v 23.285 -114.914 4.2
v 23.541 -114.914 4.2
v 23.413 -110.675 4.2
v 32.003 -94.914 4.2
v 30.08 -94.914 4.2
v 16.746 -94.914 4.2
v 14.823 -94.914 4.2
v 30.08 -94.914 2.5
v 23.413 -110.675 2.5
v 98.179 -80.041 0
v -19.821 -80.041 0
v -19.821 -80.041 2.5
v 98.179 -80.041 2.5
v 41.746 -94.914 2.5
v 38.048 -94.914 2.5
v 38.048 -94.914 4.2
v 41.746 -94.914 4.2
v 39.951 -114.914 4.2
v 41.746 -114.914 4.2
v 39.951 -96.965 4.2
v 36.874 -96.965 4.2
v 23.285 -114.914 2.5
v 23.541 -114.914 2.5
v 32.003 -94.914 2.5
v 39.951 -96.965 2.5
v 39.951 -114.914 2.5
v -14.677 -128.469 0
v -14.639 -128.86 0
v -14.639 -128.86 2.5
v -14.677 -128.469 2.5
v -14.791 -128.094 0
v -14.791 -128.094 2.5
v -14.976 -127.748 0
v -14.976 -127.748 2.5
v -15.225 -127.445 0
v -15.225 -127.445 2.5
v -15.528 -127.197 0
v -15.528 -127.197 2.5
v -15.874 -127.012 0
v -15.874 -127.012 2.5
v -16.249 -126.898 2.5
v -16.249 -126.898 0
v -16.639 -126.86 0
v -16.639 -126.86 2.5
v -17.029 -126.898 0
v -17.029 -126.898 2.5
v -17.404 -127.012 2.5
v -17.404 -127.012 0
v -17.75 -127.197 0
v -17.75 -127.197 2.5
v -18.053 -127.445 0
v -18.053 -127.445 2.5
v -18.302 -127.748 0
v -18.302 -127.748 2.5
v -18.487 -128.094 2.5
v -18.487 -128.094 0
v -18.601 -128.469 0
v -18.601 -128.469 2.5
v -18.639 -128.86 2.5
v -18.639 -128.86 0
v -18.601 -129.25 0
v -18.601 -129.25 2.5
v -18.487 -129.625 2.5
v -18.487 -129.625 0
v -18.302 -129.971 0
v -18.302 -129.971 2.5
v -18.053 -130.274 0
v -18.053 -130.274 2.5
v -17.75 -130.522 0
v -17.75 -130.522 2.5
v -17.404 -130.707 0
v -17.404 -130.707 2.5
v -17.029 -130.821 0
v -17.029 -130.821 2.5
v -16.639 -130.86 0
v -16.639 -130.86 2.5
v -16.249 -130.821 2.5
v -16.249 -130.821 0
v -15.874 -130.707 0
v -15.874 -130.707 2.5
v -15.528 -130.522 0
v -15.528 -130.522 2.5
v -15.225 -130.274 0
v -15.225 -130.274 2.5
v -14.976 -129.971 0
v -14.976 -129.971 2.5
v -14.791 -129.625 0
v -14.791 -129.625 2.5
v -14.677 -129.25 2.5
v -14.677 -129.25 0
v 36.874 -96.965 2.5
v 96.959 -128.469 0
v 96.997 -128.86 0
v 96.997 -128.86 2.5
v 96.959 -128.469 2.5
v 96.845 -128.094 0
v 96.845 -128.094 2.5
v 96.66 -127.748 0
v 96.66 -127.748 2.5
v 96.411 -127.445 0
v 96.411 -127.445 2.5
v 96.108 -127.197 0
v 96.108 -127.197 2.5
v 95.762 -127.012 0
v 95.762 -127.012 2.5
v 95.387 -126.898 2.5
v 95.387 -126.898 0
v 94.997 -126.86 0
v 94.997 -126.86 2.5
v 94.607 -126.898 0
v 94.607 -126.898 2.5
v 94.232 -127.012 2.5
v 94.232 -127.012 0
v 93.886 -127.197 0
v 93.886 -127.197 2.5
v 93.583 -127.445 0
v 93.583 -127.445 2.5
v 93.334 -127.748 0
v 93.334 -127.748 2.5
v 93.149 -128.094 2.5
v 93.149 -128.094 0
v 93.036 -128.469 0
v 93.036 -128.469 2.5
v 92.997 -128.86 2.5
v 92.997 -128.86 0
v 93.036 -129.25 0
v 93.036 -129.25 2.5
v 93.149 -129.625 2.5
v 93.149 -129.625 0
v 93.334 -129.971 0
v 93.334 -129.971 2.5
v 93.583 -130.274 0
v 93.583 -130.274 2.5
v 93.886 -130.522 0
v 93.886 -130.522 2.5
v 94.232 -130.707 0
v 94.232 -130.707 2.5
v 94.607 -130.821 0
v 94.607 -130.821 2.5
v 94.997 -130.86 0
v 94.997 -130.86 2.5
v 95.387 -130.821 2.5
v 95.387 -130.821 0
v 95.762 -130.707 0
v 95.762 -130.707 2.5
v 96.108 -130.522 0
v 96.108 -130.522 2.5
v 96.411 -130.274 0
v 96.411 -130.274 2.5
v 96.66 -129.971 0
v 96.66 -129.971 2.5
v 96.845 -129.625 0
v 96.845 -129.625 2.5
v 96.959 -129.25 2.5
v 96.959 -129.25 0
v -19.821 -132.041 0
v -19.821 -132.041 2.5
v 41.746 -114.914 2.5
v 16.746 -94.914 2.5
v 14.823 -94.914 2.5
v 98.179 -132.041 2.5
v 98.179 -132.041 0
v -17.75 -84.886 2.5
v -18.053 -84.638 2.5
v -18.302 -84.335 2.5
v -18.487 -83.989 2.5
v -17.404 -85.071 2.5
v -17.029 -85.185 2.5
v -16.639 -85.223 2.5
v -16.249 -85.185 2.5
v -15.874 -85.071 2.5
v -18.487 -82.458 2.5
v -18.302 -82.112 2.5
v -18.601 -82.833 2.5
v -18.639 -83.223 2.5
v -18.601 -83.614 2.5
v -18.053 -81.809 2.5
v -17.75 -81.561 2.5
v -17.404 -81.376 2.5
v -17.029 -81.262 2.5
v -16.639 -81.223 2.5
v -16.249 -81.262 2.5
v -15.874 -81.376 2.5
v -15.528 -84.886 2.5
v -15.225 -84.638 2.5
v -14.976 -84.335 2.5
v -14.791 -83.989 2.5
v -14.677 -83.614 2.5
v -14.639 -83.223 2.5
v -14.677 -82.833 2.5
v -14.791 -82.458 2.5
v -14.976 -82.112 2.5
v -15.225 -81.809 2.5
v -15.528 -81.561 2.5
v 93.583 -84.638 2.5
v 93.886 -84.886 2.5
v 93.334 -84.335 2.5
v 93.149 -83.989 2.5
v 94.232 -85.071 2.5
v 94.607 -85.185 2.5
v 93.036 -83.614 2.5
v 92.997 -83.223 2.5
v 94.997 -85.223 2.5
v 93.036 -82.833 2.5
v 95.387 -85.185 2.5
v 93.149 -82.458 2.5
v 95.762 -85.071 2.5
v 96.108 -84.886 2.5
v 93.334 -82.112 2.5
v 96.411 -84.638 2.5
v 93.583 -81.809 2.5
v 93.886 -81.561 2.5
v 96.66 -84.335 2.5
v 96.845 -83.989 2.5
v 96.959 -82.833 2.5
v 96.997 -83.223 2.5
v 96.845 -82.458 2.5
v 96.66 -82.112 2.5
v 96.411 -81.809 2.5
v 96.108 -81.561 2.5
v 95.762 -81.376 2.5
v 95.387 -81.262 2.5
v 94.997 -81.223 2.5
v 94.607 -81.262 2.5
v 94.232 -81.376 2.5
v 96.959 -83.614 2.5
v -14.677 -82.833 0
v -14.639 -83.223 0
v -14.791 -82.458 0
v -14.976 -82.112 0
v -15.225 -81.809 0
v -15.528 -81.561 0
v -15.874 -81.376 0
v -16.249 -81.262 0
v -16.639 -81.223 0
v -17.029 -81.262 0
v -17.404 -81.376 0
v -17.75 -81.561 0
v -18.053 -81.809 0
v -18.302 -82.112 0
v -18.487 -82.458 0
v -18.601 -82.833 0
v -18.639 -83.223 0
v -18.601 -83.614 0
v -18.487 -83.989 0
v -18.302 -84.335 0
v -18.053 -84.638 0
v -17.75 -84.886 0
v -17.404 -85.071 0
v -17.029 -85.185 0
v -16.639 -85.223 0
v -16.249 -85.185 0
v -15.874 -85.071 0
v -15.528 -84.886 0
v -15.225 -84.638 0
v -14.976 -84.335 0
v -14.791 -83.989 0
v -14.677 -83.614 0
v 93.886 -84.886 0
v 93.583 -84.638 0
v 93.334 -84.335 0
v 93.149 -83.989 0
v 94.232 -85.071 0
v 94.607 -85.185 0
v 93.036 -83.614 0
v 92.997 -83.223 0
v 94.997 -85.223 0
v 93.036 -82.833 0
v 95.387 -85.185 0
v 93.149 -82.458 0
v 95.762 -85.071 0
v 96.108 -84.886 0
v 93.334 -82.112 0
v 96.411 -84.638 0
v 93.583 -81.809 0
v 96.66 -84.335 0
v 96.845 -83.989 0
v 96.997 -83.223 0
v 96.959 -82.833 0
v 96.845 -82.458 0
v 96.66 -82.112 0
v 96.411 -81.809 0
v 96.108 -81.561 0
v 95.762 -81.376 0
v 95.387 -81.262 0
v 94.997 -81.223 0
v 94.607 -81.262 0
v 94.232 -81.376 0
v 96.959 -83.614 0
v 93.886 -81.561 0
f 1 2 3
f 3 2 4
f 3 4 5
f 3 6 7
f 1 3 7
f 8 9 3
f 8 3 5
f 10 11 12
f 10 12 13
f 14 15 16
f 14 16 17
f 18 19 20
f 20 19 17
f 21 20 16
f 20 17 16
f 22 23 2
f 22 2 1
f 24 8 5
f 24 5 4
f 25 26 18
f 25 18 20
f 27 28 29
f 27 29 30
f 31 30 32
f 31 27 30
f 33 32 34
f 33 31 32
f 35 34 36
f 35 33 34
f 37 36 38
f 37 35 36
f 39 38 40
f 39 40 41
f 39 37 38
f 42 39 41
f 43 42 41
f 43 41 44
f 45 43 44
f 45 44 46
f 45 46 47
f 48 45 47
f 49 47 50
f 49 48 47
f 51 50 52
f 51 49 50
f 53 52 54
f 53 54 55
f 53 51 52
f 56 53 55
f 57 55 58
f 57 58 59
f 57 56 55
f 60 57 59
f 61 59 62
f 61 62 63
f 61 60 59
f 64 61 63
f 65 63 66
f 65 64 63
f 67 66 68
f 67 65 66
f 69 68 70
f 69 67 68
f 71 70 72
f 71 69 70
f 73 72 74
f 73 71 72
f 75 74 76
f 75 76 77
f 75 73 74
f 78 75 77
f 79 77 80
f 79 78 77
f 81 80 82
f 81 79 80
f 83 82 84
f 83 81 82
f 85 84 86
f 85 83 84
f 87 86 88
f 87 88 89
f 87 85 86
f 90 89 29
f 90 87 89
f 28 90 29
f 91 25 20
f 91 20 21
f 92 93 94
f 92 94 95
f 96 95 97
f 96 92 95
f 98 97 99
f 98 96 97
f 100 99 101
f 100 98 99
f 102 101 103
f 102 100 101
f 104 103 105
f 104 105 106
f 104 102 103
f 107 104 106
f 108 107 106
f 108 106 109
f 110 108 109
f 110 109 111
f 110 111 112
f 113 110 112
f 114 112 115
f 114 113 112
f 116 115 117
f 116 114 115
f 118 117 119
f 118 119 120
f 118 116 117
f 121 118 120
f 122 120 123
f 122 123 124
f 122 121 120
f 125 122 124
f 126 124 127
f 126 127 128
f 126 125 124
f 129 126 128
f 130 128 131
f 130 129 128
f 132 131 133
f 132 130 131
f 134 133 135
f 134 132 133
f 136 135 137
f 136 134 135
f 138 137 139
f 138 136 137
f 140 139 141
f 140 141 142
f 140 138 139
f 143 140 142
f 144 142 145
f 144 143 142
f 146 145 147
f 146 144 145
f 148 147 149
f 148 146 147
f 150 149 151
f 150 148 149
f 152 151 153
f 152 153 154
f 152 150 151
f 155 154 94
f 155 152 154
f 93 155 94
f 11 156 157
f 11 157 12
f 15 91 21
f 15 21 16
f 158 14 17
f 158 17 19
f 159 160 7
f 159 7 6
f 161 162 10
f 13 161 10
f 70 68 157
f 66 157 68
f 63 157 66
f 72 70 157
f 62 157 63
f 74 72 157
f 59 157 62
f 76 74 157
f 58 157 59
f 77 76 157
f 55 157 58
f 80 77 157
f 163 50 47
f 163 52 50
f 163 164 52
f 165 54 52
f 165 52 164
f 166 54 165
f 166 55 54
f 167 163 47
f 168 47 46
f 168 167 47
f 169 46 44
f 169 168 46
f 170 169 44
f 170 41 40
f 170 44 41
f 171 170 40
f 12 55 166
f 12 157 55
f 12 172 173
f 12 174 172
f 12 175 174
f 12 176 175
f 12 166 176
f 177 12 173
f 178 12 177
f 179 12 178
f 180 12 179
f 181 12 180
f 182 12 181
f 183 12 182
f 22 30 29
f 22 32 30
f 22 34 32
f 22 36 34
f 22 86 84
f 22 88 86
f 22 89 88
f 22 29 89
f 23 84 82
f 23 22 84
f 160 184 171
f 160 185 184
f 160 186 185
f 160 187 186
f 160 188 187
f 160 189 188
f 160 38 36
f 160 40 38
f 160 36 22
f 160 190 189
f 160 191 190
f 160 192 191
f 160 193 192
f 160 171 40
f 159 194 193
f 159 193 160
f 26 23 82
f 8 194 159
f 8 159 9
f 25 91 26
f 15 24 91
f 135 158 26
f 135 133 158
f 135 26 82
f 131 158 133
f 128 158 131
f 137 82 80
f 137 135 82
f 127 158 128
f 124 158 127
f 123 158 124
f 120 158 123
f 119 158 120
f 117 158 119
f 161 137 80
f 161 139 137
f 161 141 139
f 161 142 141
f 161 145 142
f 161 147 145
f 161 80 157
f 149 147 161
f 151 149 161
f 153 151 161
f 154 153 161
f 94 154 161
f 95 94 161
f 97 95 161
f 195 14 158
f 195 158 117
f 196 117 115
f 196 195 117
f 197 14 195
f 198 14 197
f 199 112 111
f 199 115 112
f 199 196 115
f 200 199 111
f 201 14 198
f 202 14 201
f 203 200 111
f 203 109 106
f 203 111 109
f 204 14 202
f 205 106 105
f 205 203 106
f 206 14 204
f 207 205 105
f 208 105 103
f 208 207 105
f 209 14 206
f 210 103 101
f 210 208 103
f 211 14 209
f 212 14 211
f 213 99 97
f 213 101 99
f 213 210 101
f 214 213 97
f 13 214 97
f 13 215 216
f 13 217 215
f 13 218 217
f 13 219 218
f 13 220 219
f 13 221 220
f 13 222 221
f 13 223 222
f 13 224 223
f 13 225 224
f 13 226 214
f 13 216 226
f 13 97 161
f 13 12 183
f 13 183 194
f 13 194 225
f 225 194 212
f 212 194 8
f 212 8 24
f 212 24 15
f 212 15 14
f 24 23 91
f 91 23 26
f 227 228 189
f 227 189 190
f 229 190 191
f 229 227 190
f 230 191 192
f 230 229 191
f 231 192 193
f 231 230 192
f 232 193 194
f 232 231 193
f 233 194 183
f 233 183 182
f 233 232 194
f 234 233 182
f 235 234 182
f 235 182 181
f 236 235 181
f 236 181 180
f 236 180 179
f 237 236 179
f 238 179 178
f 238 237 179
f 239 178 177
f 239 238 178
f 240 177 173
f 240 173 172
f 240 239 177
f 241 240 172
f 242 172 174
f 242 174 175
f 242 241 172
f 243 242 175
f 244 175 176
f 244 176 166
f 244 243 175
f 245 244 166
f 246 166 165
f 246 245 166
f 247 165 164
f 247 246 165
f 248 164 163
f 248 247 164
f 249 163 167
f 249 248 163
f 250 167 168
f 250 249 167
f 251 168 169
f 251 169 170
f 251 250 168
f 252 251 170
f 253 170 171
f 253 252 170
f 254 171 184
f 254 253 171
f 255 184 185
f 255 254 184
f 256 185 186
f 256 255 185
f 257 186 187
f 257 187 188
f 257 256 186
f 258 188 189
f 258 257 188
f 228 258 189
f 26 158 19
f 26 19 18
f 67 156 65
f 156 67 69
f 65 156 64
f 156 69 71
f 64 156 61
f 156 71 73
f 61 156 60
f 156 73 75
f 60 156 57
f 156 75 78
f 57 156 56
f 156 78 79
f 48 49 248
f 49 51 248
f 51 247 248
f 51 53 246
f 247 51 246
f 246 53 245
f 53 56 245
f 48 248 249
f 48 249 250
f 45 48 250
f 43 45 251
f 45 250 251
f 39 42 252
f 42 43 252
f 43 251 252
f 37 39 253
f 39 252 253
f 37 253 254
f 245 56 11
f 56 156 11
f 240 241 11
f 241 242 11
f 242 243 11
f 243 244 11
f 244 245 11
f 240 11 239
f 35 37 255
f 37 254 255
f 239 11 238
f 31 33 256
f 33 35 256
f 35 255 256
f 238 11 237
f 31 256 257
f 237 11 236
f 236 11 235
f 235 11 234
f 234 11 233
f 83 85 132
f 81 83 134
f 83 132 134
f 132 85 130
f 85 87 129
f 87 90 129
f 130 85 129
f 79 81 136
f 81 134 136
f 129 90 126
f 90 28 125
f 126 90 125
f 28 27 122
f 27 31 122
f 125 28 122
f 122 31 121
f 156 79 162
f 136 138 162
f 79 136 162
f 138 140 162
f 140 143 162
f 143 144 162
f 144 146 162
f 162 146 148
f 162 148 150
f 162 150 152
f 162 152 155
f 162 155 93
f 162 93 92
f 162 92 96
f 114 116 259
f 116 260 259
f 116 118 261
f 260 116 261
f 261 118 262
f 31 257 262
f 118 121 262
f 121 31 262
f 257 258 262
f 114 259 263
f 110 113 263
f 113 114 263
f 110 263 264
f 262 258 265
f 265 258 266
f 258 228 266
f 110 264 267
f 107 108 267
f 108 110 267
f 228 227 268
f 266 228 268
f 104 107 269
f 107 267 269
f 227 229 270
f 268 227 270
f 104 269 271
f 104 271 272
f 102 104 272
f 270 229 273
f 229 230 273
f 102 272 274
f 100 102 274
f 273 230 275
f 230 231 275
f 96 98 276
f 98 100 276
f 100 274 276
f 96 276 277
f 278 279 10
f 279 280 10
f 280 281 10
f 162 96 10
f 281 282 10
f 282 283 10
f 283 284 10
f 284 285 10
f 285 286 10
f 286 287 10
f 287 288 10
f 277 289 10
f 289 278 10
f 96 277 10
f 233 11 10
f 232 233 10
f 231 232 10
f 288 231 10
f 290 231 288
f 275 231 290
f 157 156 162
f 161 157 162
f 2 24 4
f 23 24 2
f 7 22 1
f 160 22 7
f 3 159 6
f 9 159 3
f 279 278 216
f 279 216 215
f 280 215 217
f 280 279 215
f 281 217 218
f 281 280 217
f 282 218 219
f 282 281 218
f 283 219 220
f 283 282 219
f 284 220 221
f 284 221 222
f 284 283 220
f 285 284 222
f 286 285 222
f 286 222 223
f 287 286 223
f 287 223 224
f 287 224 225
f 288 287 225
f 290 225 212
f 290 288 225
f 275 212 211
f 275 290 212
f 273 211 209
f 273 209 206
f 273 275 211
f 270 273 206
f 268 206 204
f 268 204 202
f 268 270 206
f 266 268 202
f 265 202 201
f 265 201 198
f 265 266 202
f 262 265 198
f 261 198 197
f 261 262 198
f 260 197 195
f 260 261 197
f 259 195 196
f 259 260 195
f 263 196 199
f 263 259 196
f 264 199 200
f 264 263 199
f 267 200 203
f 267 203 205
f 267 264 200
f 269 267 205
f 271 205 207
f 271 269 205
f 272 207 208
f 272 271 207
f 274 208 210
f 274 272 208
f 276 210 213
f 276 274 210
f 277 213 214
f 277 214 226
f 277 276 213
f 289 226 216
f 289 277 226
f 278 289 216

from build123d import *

# Parameters (mm, degrees)
SKETCH1_W           = 118
SKETCH1_H           = 52
SKETCH1_R           = 2
BOSS_EXTRUDE1_DEPTH = 2.5
BOSS_EXTRUDE2_DEPTH = 1.7


with BuildPart() as part:
    # Sketch1 → Boss-Extrude1 (new body)
    with BuildSketch(Plane.XY):
        with Locations((39.179079988, -106.041481737)):
            Rectangle(SKETCH1_W, SKETCH1_H)
        with Locations((-16.638939496, -128.859501222)):
            Circle(SKETCH1_R, mode=Mode.SUBTRACT)
        with Locations((94.997099473, -128.859501222)):
            Circle(SKETCH1_R, mode=Mode.SUBTRACT)
        with Locations((94.997099473, -83.223462252)):
            Circle(SKETCH1_R, mode=Mode.SUBTRACT)
        with Locations((-16.638939496, -83.223462252)):
            Circle(SKETCH1_R, mode=Mode.SUBTRACT)
    extrude(amount=BOSS_EXTRUDE1_DEPTH)

    # Sketch2 → Boss-Extrude2 (add)
    with BuildSketch(Plane.XY.offset(2.5)):
        Polygon((14.823144888, -94.914102462), (16.746221811, -94.914102462), (23.412888478, -110.67532041), (30.079555144, -94.914102462), (32.002632067, -94.914102462), (23.541093606, -114.914102462), (23.284683349, -114.914102462), align=None)
        Polygon((38.048305144, -94.914102462), (41.746221811, -94.914102462), (41.746221811, -114.914102462), (39.951350016, -114.914102462), (39.951350016, -96.965384513), (36.874426939, -96.965384513), align=None)
    extrude(amount=BOSS_EXTRUDE2_DEPTH)


solid = part.part
